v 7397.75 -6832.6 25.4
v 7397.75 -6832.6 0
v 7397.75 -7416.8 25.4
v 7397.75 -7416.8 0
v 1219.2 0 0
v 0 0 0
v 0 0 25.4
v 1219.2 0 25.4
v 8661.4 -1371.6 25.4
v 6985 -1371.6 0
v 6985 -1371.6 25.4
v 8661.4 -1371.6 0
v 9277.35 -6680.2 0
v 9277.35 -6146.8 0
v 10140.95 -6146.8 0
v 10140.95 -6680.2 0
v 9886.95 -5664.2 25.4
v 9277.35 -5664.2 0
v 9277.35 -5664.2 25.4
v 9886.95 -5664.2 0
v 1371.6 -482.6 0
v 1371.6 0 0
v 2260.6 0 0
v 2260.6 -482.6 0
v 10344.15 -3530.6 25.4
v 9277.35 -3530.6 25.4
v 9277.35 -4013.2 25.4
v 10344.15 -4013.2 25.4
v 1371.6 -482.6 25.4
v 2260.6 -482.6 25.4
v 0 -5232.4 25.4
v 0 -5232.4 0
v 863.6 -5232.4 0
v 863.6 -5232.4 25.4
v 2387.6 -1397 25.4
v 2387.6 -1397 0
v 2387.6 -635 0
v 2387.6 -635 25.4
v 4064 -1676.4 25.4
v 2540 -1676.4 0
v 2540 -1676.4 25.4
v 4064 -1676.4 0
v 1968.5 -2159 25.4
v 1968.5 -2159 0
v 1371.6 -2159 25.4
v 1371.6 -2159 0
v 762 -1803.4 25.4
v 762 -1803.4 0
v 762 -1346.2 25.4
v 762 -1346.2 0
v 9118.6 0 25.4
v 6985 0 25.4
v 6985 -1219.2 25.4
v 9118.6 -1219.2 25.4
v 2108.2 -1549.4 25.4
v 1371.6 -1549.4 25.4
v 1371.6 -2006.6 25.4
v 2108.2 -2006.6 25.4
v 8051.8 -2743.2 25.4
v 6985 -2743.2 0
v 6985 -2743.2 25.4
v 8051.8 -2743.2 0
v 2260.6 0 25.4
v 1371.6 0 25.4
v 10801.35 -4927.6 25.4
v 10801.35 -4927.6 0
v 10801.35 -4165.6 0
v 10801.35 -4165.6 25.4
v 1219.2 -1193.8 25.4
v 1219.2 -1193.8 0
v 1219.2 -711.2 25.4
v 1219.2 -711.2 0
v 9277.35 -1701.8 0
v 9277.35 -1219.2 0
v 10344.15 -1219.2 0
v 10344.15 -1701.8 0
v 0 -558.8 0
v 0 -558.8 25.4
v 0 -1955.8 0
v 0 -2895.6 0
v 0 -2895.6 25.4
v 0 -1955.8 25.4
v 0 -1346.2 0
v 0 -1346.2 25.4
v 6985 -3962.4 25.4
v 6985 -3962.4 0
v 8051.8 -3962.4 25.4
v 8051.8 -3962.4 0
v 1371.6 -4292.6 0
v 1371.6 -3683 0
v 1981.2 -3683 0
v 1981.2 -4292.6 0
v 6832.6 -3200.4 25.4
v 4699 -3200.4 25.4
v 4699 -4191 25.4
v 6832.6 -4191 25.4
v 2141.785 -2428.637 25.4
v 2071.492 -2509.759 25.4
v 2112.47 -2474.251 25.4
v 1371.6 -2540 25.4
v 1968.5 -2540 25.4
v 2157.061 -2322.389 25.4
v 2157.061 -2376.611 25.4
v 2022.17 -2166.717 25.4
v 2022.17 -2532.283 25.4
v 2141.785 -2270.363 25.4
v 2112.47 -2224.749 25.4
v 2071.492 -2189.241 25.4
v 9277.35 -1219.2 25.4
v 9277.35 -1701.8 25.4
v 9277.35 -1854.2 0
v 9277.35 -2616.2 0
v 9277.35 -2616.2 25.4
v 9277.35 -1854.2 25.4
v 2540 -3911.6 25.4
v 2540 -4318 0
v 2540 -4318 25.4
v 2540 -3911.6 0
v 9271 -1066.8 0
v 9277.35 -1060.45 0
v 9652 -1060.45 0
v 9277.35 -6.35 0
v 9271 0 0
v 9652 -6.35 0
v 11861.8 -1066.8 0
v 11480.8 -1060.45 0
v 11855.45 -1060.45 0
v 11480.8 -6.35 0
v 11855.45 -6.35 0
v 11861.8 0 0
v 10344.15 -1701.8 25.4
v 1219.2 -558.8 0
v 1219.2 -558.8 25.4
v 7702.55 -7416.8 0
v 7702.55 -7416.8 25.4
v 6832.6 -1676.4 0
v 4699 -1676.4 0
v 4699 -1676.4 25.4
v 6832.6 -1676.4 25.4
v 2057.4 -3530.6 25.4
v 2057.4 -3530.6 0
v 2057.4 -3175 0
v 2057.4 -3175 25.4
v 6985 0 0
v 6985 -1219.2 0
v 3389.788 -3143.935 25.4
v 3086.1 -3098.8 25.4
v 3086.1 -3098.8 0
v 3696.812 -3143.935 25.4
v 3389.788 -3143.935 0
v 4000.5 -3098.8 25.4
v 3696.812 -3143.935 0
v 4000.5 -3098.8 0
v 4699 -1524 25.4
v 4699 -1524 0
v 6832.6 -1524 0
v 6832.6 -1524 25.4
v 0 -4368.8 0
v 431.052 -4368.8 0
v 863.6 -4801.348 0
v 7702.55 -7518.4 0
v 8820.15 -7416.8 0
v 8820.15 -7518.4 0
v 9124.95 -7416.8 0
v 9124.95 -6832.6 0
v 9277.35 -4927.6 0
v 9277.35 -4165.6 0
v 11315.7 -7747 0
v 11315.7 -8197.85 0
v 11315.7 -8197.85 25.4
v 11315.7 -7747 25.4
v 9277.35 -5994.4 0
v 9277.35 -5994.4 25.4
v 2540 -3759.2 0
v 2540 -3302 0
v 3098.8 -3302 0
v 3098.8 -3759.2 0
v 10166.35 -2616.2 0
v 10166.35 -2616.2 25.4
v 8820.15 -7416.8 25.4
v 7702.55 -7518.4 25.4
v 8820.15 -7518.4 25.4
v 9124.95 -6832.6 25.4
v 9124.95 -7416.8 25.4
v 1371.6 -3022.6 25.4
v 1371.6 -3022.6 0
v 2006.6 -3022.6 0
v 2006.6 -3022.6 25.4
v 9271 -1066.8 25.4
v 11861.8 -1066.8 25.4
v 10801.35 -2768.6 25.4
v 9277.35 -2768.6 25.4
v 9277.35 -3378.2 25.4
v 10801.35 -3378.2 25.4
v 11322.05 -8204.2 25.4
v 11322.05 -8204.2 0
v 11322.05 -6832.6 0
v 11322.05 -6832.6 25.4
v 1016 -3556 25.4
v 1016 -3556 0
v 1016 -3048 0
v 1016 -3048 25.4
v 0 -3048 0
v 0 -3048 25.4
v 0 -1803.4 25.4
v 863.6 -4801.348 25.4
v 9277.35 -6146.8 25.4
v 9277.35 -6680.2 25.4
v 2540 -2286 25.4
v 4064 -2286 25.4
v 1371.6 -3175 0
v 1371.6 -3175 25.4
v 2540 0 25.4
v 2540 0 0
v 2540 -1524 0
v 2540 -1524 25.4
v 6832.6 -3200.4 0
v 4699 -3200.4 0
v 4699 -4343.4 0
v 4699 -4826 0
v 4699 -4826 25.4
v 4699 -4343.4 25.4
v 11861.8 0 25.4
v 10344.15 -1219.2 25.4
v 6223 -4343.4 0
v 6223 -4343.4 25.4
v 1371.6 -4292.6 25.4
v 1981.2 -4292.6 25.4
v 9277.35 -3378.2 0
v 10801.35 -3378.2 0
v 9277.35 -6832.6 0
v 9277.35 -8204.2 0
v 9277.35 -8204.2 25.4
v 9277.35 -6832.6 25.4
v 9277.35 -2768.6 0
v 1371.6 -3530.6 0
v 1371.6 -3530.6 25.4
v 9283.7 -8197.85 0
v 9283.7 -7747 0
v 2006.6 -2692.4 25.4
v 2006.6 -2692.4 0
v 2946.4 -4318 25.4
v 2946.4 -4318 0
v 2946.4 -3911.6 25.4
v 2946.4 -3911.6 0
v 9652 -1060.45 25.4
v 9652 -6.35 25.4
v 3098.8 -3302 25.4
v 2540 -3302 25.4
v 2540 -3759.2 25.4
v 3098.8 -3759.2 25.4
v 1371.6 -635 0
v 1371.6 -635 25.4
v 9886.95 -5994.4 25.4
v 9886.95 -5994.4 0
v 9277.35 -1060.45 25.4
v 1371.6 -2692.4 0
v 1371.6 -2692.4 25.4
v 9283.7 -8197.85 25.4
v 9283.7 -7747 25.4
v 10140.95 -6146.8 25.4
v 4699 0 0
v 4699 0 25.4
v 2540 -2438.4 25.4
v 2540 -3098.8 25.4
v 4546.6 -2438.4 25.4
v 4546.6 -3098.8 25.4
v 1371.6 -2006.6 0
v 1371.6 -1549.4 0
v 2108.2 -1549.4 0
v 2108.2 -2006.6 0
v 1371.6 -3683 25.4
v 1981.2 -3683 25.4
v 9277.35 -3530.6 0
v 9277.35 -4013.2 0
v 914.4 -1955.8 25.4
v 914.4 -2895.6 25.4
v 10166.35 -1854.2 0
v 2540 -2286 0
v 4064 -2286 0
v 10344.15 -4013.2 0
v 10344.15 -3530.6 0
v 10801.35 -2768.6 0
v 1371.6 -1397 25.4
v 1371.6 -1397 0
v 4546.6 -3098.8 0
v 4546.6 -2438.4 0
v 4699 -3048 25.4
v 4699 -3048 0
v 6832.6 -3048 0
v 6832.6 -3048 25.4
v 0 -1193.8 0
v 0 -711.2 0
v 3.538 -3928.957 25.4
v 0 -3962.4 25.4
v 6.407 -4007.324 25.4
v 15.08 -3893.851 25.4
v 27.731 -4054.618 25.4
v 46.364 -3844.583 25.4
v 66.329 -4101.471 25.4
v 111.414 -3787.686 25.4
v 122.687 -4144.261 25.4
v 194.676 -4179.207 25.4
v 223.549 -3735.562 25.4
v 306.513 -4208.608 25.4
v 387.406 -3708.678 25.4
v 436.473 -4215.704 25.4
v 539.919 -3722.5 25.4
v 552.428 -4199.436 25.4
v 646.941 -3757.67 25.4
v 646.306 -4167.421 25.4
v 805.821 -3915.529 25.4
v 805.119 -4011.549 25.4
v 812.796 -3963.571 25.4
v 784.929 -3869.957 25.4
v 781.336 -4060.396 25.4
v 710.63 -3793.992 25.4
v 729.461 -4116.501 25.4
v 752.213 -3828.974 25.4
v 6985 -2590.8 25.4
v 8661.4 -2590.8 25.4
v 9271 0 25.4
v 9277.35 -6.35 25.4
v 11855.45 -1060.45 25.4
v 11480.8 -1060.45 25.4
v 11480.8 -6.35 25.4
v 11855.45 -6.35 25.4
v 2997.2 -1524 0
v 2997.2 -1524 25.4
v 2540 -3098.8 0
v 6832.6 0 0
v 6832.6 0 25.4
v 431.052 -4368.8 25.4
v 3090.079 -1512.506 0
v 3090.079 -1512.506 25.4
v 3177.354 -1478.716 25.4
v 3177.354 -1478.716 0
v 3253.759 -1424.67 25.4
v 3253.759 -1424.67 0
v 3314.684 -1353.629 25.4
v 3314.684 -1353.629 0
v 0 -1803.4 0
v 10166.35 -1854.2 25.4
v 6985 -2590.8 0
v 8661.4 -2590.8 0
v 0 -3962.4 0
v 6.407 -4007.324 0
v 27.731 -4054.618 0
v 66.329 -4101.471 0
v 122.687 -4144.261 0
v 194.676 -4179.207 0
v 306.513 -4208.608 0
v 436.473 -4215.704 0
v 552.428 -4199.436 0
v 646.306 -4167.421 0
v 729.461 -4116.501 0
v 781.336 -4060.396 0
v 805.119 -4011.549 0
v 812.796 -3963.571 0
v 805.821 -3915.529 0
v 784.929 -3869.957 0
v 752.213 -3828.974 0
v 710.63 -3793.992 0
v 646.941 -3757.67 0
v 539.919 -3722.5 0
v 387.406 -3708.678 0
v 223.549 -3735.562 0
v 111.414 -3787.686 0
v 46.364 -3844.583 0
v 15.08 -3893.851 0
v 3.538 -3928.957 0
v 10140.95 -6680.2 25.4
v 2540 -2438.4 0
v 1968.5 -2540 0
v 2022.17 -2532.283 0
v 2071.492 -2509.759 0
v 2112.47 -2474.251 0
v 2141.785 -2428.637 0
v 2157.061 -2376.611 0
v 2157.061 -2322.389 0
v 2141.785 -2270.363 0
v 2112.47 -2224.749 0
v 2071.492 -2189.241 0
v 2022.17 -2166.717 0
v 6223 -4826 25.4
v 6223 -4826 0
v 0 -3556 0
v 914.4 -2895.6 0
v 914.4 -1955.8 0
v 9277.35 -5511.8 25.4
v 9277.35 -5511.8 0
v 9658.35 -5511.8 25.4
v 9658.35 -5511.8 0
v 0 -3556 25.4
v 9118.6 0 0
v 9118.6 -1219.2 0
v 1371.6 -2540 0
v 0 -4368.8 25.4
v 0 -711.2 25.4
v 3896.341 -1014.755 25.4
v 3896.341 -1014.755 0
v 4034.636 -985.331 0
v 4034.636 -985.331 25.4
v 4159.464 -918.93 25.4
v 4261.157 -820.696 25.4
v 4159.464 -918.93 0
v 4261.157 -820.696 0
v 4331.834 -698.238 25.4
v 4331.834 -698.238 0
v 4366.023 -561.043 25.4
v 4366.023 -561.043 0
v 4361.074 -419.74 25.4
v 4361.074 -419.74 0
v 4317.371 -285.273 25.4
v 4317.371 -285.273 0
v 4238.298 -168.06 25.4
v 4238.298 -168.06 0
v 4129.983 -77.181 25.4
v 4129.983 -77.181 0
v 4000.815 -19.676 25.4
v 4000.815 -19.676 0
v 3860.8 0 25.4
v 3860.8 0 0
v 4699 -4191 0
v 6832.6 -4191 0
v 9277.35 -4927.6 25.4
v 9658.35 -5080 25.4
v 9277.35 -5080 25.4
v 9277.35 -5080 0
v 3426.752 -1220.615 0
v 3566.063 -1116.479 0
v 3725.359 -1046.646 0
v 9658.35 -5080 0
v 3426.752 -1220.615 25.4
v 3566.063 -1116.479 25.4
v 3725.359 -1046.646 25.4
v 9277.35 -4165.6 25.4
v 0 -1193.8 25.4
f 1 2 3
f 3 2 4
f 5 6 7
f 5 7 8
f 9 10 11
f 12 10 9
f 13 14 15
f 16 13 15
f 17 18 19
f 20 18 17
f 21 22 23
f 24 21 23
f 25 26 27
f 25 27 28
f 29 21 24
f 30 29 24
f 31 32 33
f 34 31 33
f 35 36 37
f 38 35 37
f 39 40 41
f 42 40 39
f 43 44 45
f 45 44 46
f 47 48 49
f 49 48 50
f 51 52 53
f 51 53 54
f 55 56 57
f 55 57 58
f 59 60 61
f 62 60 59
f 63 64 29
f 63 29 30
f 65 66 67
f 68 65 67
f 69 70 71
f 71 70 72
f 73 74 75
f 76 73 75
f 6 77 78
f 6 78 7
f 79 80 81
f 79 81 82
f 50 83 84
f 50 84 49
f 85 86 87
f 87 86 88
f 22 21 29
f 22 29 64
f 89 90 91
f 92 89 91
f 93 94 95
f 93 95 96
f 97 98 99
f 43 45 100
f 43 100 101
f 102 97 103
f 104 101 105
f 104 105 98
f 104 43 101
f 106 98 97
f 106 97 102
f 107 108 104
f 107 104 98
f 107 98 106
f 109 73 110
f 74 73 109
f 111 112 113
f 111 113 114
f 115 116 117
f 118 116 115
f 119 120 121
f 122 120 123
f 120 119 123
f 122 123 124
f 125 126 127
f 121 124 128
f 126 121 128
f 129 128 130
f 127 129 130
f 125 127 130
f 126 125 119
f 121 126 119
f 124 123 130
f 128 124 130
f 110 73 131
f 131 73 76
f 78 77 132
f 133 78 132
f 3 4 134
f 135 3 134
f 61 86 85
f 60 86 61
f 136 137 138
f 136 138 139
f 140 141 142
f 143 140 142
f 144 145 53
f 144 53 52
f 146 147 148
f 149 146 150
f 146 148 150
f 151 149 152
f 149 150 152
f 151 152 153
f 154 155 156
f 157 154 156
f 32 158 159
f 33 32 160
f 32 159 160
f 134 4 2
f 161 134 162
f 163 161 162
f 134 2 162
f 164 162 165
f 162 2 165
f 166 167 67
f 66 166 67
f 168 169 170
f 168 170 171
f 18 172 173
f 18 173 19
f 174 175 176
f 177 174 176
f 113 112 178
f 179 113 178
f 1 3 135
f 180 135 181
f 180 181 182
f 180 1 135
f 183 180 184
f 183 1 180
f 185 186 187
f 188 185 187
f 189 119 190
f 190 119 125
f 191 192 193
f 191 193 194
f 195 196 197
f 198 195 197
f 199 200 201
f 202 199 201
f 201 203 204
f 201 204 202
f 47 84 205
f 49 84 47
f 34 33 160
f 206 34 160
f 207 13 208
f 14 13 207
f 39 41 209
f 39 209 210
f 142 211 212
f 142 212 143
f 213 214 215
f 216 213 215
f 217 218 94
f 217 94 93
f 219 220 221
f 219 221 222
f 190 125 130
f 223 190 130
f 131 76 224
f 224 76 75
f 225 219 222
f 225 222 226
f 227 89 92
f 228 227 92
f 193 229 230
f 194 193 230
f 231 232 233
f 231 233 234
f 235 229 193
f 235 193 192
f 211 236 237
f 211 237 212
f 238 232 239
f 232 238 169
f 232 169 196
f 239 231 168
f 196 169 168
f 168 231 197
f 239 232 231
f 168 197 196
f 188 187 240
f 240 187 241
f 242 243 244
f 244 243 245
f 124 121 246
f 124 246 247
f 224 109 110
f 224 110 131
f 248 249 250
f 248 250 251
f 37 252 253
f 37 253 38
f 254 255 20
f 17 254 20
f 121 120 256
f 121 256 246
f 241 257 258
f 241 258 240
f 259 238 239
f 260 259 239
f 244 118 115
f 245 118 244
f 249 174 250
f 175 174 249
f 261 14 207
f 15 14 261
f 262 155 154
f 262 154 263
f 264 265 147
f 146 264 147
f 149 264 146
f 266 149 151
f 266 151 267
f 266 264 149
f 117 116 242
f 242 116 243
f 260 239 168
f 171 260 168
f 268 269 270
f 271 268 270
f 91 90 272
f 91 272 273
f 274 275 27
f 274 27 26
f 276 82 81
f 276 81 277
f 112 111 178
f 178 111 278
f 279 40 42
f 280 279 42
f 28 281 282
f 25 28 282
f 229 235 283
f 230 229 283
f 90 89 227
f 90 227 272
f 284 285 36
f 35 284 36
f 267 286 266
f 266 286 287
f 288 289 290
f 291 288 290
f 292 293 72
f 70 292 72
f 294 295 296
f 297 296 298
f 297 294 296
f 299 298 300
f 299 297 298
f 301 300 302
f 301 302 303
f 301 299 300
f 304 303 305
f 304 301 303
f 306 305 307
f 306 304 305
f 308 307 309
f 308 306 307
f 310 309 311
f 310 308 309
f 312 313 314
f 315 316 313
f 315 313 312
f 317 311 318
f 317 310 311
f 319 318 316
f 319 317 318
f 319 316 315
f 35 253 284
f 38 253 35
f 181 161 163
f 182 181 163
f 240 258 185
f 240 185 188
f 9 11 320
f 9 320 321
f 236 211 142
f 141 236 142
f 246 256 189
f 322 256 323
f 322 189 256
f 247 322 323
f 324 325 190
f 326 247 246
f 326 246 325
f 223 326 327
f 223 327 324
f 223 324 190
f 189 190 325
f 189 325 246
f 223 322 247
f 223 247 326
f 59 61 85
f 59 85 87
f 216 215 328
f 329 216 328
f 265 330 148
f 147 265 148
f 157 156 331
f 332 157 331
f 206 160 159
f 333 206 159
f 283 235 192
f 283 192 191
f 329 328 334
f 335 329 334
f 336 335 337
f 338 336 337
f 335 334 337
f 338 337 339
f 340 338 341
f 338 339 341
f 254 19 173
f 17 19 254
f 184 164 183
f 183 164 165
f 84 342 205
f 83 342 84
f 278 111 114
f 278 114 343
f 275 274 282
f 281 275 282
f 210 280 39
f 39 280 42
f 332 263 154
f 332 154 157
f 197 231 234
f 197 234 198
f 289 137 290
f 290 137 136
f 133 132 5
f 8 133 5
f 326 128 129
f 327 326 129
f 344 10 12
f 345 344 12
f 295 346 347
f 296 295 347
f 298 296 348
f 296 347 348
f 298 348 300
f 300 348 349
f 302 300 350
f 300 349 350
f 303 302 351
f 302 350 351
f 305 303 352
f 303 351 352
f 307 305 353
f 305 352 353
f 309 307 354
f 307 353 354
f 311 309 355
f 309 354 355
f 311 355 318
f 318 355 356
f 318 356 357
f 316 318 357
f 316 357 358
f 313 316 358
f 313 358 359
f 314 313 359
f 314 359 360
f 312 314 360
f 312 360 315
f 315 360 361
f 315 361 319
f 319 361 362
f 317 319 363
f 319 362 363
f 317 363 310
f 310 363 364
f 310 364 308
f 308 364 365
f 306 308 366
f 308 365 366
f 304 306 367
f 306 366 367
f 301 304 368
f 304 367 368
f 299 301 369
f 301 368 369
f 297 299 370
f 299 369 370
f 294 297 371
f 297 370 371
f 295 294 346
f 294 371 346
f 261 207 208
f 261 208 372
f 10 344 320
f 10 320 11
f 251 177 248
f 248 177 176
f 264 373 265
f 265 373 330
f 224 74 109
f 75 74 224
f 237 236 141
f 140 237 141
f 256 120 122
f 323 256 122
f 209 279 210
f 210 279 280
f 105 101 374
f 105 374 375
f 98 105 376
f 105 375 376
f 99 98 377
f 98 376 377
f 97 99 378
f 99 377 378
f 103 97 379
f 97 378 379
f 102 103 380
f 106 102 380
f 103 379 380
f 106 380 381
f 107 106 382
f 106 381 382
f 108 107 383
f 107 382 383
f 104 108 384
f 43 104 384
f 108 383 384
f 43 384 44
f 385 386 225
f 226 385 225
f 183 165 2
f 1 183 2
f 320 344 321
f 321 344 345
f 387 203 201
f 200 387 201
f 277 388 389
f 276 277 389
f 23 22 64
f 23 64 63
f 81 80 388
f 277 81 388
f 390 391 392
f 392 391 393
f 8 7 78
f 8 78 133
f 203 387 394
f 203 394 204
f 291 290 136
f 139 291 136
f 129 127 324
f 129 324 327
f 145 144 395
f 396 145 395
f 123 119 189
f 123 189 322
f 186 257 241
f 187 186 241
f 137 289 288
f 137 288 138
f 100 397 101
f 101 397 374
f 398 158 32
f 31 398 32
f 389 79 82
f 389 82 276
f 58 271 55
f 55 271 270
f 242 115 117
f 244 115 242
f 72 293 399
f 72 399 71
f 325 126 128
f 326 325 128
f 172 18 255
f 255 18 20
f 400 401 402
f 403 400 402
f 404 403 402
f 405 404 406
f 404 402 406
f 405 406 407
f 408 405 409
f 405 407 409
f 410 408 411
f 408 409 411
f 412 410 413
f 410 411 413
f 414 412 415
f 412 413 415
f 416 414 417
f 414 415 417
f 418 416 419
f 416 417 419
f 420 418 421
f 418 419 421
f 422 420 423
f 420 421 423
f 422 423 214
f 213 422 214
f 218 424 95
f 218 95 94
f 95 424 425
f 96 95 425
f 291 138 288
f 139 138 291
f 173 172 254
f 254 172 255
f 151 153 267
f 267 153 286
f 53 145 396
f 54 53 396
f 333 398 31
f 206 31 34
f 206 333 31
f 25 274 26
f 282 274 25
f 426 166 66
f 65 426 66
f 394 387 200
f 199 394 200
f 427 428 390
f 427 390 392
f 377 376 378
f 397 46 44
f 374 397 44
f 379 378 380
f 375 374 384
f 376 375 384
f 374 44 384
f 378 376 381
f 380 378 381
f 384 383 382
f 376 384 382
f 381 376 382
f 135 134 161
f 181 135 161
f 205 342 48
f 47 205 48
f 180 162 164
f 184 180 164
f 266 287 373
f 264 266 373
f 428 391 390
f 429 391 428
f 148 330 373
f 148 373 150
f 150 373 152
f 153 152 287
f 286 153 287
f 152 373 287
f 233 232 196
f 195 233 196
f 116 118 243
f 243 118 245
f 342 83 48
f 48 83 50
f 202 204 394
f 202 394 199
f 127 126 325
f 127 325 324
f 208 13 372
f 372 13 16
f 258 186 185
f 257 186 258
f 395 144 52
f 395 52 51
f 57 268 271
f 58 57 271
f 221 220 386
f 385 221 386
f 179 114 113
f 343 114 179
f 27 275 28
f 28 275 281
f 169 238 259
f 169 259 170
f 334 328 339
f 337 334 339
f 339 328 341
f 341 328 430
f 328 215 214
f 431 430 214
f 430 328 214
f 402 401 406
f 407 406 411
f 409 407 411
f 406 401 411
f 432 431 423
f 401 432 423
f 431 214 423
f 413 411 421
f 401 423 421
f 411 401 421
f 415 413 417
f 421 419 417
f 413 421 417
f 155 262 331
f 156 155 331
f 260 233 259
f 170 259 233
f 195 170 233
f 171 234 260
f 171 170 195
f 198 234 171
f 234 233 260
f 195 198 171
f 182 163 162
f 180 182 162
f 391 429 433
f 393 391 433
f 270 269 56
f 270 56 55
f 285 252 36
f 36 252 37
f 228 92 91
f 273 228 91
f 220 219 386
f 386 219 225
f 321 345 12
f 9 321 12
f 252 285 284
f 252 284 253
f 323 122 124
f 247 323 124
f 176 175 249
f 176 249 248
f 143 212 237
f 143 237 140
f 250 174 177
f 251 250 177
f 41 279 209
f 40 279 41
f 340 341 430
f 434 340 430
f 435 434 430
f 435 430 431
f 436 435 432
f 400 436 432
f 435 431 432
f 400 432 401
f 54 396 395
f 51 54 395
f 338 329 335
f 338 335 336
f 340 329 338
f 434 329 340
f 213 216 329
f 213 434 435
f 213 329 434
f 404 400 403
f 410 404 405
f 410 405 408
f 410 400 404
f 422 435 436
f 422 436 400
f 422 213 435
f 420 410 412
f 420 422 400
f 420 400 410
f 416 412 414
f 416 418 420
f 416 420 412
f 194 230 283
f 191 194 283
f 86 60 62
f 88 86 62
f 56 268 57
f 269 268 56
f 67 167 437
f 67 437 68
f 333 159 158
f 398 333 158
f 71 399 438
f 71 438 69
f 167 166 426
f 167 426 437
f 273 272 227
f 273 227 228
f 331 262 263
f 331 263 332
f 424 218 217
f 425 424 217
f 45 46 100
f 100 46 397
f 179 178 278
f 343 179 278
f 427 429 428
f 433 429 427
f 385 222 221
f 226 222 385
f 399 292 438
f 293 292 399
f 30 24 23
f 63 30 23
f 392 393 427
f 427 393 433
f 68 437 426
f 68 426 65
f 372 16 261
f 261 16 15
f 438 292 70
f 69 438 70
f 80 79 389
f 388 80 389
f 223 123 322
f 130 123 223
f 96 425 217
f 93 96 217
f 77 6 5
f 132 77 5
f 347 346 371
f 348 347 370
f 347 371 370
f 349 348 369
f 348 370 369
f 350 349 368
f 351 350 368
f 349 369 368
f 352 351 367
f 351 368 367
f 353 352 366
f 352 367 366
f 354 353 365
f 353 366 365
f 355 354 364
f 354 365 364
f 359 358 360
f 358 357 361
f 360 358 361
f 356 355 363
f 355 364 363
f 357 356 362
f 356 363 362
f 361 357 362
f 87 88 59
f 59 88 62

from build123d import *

# Parameters (mm, degrees)
F0_W     = 1219.2
F0_H     = 558.8
F0_H_2   = 482.6
F0_W_2   = 762
F0_H_3   = 457.2
F0_W_3   = 914.4
F0_H_4   = 939.8
F0_W_4   = 1016
F0_H_5   = 508
F0_W_5   = 889
F0_H_6   = 762
F0_W_6   = 736.6
F0_W_7   = 635
F0_H_7   = 330.2
F0_W_8   = 685.8
F0_H_8   = 355.6
F0_W_9   = 609.6
F0_H_9   = 609.6
F0_W_10  = 1524
F0_W_11  = 558.8
F0_W_12  = 406.4
F0_H_10  = 406.4
F0_W_13  = 2133.6
F0_H_11  = 1524
F0_H_12  = 1371.6
F0_H_13  = 990.6
F0_H_14  = 1219.2
F0_W_14  = 1676.4
F0_W_15  = 1066.8
F0_W_16  = 2590.8
F0_H_15  = 1066.8
F0_W_17  = 374.65
F0_H_16  = 1054.1
F0_W_18  = 381
F0_H_17  = 431.8
F0_W_19  = 863.6
F0_H_18  = 533.4
F0_W_20  = 2044.7
F0_W_21  = 2032
F0_H_19  = 450.85
F1_DEPTH = 25.4


with BuildPart() as f1:
    # F0 (on Top) → F1 (new body)
    with BuildSketch(Plane.XY):
        with Locations((609.6, -279.4)):
            Rectangle(F0_W, F0_H)
        with Locations((609.6, -952.5)):
            Rectangle(F0_W, F0_H_2)
        with Locations((381, -1574.8)):
            Rectangle(F0_W_2, F0_H_3)
        with Locations((457.2, -2425.7)):
            Rectangle(F0_W_3, F0_H_4)
        with Locations((508, -3302)):
            Rectangle(F0_W_4, F0_H_5)
        with BuildLine():
            add(Edge.make_bspline(
                [(0, -3962.4), (0, -4402.340905), (609.6, -4182.370453), (1219.2, -3962.4), (609.6, -3742.429547), (0, -3522.459095), (0, -3962.4)],
                knots=[0, 0, 0, 2.094395, 2.094395, 4.18879, 4.18879, 6.283185, 6.283185, 6.283185], degree=2, weights=[1, 0.5, 1, 0.5, 1, 0.5, 1]))
        make_face()
        with Locations((1816.1, -241.3)):
            Rectangle(F0_W_5, F0_H_2)
        with Locations((1879.6, -1016)):
            Rectangle(F0_W_4, F0_H_6)
        with Locations((1739.9, -1778)):
            Rectangle(F0_W_6, F0_H_3)
        with BuildLine():
            Line((1968.5, -2159), (1371.6, -2159))
            Line((1371.6, -2159), (1371.6, -2540))
            Line((1371.6, -2540), (1968.5, -2540))
            ThreePointArc((1968.5, -2540), (2159, -2349.5), (1968.5, -2159))
        make_face()
        with Locations((1689.1, -2857.5)):
            Rectangle(F0_W_7, F0_H_7)
        with Locations((1714.5, -3352.8)):
            Rectangle(F0_W_8, F0_H_8)
        with Locations((1676.4, -3987.8)):
            Rectangle(F0_W_9, F0_H_9)
        with BuildLine():
            Line((3860.8, 0), (2540, 0))
            Line((2540, 0), (2540, -1524))
            Line((2540, -1524), (2997.2, -1524))
            ThreePointArc((2997.2, -1524), (3177.354415, -1478.71623), (3314.684309, -1353.629327))
            ThreePointArc((3314.684309, -1353.629327), (3566.062797, -1116.478829), (3896.341171, -1014.755193))
            ThreePointArc((3896.341171, -1014.755193), (4368.488703, -490.218518), (3860.8, 0))
        make_face()
        with Locations((3302, -1981.2)):
            Rectangle(F0_W_10, F0_H_9)
        with BuildLine():
            Line((2540, -3098.8), (3086.1, -3098.8))
            ThreePointArc((3086.1, -3098.8), (3543.3, -3149.6), (4000.5, -3098.8))
            Line((4000.5, -3098.8), (4546.6, -3098.8))
            Line((4546.6, -3098.8), (4546.6, -2438.4))
            Line((4546.6, -2438.4), (2540, -2438.4))
            Line((2540, -2438.4), (2540, -3098.8))
        make_face()
        with Locations((2819.4, -3530.6)):
            Rectangle(F0_W_11, F0_H_3)
        with Locations((2743.2, -4114.8)):
            Rectangle(F0_W_12, F0_H_10)
        with Locations((5765.8, -762)):
            Rectangle(F0_W_13, F0_H_11)
        with Locations((5765.8, -2362.2)):
            Rectangle(F0_W_13, F0_H_12)
        with Locations((5765.8, -3695.7)):
            Rectangle(F0_W_13, F0_H_13)
        with Locations((8051.8, -609.6)):
            Rectangle(F0_W_13, F0_H_14)
        with Locations((7823.2, -1981.2)):
            Rectangle(F0_W_14, F0_H_14)
        with Locations((7518.4, -3352.8)):
            Rectangle(F0_W_15, F0_H_14)
        with Locations((10566.4, -533.4)):
            Rectangle(F0_W_16, F0_H_15)
        with Locations((9464.675, -533.4)):
            Rectangle(F0_W_17, F0_H_16, mode=Mode.SUBTRACT)
        with Locations((11668.125, -533.4)):
            Rectangle(F0_W_17, F0_H_16, mode=Mode.SUBTRACT)
        with Locations((9810.75, -1460.5)):
            Rectangle(F0_W_15, F0_H_2)
        with Locations((9721.85, -2235.2)):
            Rectangle(F0_W_5, F0_H_6)
        with Locations((10039.35, -3073.4)):
            Rectangle(F0_W_10, F0_H_9)
        with Locations((9810.75, -3771.9)):
            Rectangle(F0_W_15, F0_H_2)
        with Locations((10039.35, -4546.6)):
            Rectangle(F0_W_10, F0_H_6)
        with Locations((9467.85, -5295.9)):
            Rectangle(F0_W_18, F0_H_17)
        with Locations((9582.15, -5829.3)):
            Rectangle(F0_W_9, F0_H_7)
        with Locations((9709.15, -6413.5)):
            Rectangle(F0_W_19, F0_H_18)
        with Locations((10299.7, -7518.4)):
            Rectangle(F0_W_20, F0_H_12)
        with Locations((10299.7, -7972.425)):
            Rectangle(F0_W_21, F0_H_19, mode=Mode.SUBTRACT)
        Polygon((9124.95, -7416.8), (9124.95, -6832.6), (7397.75, -6832.6), (7397.75, -7416.8), (7702.55, -7416.8), (7702.55, -7518.4), (8820.15, -7518.4), (8820.15, -7416.8), align=None)
        Polygon((431.052294, -4368.8), (0, -4368.8), (0, -5232.4), (863.6, -5232.4), (863.6, -4801.347706), align=None)
        with Locations((5461, -4584.7)):
            Rectangle(F0_W_10, F0_H_2)
    extrude(amount=F1_DEPTH)


solid = f1.part
